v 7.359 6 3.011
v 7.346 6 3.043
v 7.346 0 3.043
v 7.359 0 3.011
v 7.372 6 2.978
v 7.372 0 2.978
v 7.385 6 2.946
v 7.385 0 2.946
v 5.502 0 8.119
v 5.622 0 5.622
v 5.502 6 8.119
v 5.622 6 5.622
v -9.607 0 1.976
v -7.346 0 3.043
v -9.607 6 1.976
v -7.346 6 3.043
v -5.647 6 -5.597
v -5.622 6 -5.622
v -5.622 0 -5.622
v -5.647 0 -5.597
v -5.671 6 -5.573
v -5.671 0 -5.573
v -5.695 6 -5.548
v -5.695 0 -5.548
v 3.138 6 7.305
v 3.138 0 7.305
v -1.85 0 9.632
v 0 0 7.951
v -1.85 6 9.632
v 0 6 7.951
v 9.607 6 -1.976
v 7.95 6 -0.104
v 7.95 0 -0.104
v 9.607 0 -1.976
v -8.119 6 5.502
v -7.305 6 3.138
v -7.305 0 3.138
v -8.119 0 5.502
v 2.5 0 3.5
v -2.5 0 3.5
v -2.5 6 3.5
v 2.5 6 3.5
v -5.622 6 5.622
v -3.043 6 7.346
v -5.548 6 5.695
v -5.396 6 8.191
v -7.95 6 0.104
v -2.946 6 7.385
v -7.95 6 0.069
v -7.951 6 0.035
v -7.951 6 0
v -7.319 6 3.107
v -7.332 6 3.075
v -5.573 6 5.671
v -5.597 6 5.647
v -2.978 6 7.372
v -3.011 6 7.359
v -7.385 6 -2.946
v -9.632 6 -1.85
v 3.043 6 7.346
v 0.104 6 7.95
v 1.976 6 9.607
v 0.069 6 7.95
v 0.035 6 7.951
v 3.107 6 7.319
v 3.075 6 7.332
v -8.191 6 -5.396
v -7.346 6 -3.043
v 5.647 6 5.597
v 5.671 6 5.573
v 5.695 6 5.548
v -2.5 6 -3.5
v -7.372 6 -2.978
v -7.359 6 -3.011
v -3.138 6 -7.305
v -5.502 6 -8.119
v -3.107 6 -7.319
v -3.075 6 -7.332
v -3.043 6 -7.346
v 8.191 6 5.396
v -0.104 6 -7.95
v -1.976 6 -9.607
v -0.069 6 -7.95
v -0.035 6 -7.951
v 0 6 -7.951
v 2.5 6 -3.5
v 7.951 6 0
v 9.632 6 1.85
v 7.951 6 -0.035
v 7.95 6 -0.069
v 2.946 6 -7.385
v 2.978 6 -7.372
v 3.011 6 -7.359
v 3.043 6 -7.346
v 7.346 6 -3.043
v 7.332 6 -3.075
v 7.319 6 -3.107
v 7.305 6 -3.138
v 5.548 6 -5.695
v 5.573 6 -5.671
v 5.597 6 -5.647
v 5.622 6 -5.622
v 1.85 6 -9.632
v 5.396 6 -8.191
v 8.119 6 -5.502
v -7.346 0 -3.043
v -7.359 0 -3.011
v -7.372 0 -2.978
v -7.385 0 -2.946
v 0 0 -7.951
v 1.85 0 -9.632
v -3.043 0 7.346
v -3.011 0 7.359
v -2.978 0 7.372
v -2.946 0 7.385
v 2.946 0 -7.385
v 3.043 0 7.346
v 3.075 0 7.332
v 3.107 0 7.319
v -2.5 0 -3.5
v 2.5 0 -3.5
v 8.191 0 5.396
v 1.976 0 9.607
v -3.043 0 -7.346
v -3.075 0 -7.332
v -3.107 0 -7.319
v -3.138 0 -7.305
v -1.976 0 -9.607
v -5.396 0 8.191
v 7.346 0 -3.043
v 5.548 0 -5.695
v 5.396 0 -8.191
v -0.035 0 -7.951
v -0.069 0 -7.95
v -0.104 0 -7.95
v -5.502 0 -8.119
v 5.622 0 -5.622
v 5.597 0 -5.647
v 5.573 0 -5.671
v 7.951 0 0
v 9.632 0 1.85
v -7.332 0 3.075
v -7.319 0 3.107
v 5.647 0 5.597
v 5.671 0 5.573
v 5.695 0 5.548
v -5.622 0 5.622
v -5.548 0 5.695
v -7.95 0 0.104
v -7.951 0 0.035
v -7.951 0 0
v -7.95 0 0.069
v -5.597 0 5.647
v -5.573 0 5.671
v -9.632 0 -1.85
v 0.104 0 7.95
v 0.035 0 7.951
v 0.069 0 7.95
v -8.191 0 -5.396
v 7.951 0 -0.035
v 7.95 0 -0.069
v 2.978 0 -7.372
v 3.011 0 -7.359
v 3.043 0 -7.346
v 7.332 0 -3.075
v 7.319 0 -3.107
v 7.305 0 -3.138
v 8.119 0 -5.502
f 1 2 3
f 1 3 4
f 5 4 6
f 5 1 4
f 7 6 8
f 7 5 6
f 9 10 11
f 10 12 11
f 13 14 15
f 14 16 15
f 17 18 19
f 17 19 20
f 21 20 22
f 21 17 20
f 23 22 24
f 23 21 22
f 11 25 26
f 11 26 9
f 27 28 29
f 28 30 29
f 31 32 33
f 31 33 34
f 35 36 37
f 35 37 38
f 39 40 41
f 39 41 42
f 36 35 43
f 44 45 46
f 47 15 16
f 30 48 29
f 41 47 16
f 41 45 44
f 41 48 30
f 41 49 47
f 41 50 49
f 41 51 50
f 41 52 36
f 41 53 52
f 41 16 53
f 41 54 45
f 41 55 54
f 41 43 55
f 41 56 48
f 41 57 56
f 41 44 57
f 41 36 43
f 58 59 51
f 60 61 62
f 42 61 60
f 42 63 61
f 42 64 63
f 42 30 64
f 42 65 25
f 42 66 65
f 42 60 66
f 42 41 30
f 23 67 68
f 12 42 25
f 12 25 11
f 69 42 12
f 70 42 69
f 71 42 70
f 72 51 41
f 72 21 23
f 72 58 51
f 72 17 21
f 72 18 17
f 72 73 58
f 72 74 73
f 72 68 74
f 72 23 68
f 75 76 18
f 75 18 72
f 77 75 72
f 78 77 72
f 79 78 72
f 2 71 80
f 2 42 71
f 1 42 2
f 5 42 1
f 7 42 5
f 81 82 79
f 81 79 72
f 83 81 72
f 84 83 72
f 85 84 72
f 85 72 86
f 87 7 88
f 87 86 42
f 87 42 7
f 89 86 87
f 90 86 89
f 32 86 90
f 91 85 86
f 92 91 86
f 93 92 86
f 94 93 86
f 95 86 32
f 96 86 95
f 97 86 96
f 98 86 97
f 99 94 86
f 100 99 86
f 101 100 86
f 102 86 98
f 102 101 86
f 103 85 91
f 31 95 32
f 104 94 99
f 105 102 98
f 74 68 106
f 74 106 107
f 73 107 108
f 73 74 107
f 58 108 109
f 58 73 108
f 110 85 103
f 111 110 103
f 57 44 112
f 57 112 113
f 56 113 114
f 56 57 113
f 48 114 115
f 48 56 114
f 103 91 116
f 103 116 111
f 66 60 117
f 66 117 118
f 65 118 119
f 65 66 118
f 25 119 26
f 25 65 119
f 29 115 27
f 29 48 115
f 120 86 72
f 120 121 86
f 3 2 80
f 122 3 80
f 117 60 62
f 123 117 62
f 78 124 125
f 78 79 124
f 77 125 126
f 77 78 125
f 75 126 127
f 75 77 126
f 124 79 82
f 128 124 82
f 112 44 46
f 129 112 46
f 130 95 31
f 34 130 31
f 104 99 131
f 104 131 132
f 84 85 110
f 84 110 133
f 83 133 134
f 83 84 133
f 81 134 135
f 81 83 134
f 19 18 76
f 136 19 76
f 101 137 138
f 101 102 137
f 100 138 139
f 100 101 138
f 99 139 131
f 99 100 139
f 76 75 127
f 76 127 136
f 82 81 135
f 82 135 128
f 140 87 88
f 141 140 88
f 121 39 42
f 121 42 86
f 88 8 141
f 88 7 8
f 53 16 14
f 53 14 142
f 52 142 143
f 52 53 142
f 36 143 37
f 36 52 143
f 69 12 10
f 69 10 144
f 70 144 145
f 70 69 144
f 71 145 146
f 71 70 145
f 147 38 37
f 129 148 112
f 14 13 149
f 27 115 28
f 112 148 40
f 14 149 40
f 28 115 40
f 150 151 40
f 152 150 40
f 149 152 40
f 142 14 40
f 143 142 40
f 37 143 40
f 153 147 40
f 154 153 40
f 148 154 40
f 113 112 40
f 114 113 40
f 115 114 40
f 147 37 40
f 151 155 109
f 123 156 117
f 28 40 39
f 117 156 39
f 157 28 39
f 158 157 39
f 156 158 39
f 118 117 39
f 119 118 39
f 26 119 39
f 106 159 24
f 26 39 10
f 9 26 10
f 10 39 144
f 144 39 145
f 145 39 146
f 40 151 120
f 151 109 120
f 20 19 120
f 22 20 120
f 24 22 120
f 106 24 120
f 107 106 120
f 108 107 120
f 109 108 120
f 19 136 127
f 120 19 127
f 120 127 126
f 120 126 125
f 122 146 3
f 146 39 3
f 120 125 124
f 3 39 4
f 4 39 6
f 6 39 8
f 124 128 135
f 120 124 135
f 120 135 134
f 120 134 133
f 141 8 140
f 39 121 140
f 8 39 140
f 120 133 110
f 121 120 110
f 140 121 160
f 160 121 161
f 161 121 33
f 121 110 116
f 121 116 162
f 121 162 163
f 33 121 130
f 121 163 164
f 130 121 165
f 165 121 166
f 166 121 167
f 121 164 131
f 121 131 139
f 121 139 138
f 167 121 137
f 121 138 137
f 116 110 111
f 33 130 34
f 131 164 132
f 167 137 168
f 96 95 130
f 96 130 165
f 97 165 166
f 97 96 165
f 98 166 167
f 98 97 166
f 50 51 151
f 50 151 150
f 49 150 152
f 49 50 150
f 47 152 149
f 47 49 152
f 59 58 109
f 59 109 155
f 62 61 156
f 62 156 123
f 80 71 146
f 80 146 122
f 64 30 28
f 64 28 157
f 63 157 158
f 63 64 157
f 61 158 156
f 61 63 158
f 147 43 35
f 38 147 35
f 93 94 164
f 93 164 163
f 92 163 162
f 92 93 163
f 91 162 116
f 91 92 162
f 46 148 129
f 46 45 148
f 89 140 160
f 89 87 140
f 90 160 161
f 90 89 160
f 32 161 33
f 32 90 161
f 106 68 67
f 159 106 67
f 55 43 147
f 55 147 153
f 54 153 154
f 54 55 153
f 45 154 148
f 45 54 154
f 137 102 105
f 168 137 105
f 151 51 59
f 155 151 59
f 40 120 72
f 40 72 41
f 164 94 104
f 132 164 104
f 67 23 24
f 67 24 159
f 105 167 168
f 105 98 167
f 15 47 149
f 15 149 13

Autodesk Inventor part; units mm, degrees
ref_plane "YZ Plane" through (0, 0, 0) normal (1, 0, 0) x (0, 1, 0)
ref_plane "XZ Plane" through (0, 0, 0) normal (0, 1, 0) x (-1, 0, 0)
ref_plane "XY Plane" through (0, 0, 0) normal (0, 0, 1) x (1, 0, 0)
sketch "Sketch1" plane through (0, 0, 0) normal (0, 1, 0) x (-1, 0, 0)
  line L0 (-3.5, -3.5) -> (0.1946, -3.5) construction
  arc A0 (-5.4544, -2.5) -> (3.5, 4.8734) centre (0, 0) ccw
  line L1 (0, -6) -> (0, -7)
  line L2 (0, -7) -> (1.3359, -5.4079)
  line L3 (0, -7) -> (2.0783, -7) construction
  line L4 (0, -7) -> (-1.4433, -5.2799)
  line L5 (0, -7) -> (2.2454, -7) construction
  circle A1 centre (0, 0) radius 6
  arc A2 (-0.4195, -6.5) -> (0.4195, -6.5) centre (0, -6.228) ccw
  line L6 (2.5, 3.5) -> (-2.5, 3.5)
  line L7 (-2.5, 3.5) -> (-2.5, -3.5)
  line L8 (-2.5, -3.5) -> (2.5, -3.5)
  line L9 (2.5, -3.5) -> (2.5, 3.5)
  point P0 (-204.25, 70)
  point P1 (-7, 0)
  point P2 (-200.75, 67.5)
  point P3 (-0.8955, -5.9328)
  point P4 (0.8955, -5.9328)
  point P5 (-0.3407, -6.594)
  point P6 (0.3407, -6.594)
  point P7 (3.5, 4.8734)
  point P8 (-5.4544, -2.5)
  dimension "d0" = 1
  dimension "d1" = 50
  dimension "d2" = 130
  dimension "d3" = 0.5
  dimension "d6" = 7
  dimension "d7" = 5
  dimension "d8" = 3.5
  dimension "d9" = 2.5
extrude "Extrusion1" add sketch "Sketch1" along normal blind 6 contours A0 A1
sketch "Sketch2" plane through (0, 6, 0) normal (0, 1, 0) x (1, 0, 0)
  arc A0 (-5.4544, -2.5) -> (3.5, 4.8734) centre (0, 0) ccw
  line L0 (0, -6) -> (0, -7)
  line L1 (0, -7) -> (1.3359, -5.4079)
  line L2 (0, -7) -> (2.0783, -7) construction
  line L3 (0, -7) -> (-1.4433, -5.2799)
  line L4 (0, -7) -> (2.2454, -7) construction
  circle A1 centre (0, 0) radius 6
  arc A2 (-0.4195, -6.5) -> (0.4195, -6.5) centre (0, -6.228) ccw
  point P0 (-200.75, 67.5)
  point P1 (-0.8955, -5.9328)
  point P2 (0.8955, -5.9328)
  point P3 (-0.3407, -6.594)
  point P4 (0.3407, -6.594)
  point P5 (-0.3407, -6.594)
  point P6 (0.3407, -6.594)
  point P7 (0.8955, -5.9328)
  point P8 (-0.8955, -5.9328)
  dimension "d12" = 1
  dimension "d13" = 50
  dimension "d14" = 130
  dimension "d15" = 0.5
extrude "Extrusion2" add sketch "Sketch2" against normal blind 2 contours L3 A0 L0 A2 | L1 A2 L0 A0
pattern_circular "Circular Pattern1" count 21 over 360 about axis through (0, 0, 0) along (0, 1, 0) of "Extrusion2"
sketch "Sketch3" plane through (0, 6, 0) normal (0, 1, 0) x (1, 0, 0)
  circle A0 centre (0, 0) radius 7.9508
  circle A1 centre (0, 0) radius 4.6059
extrude "Extrusion3" add sketch "Sketch3" against normal blind 6
sketch "Sketch4" plane through (0, 6, 0) normal (0, 1, 0) x (1, 0, 0)
  circle A0 centre (0, 0) radius 7.9508 projected
  line L0 (-7.9508, 0) -> (-7.3848, 2.9463)
  line L1 (-7.9508, 0) -> (-10.7252, 0.533)
  line L2 (-7.3848, 2.9463) -> (-10.1592, 3.4793)
  line L3 (-7.6678, 1.4731) -> (-9.6319, 1.8505)
  line L4 (-7.9508, 0) -> (-9.6319, 1.8505)
  line L5 (-7.3848, 2.9463) -> (-9.6319, 1.8505)
  arc A1 (-8.5083, 2.3984) -> (-8.7914, 0.9252) centre (-8.1829, 1.5721) ccw
  point P0 (-8.6335, 2.3373)
  point P1 (-8.885, 1.0283)
extrude "Extrusion4" add sketch "Sketch4" against normal blind 6 contours L4 L3 A1 | L5 A0 L3 A1 | L4 A1 L3 A0 | A1 L3 L5
pattern_circular "Circular Pattern2" count 16 over 360 about axis through (0, 6, 0) along (0, -1, 0) of "Extrusion4"
sketch "Sketch5" plane through (0, 6, 0) normal (0, 1, 0) x (1, 0, 0)
  point P0 (0, 0)
equation "\"d8\" = 0.5 * d6"
equation "\"d9\" = 0.5 * d7"
equation "\"BendRadius\" = Thickness"
equation "\"BendReliefWidth\" = Thickness"
equation "\"BendReliefDepth\" = 0.5 * Thickness"
equation "\"CornerReliefSize\" = 4 * Thickness"
equation "\"MinimumRemnant\" = 2 * Thickness"
equation "\"TransitionRadius\" = BendRadius"
equation "\"JacobiRadiusSize\" = BendRadius"
equation "\"GapSize\" = Thickness"
equation "\"Thickness\" = 0.5"
properties part number "modelGateGear"
